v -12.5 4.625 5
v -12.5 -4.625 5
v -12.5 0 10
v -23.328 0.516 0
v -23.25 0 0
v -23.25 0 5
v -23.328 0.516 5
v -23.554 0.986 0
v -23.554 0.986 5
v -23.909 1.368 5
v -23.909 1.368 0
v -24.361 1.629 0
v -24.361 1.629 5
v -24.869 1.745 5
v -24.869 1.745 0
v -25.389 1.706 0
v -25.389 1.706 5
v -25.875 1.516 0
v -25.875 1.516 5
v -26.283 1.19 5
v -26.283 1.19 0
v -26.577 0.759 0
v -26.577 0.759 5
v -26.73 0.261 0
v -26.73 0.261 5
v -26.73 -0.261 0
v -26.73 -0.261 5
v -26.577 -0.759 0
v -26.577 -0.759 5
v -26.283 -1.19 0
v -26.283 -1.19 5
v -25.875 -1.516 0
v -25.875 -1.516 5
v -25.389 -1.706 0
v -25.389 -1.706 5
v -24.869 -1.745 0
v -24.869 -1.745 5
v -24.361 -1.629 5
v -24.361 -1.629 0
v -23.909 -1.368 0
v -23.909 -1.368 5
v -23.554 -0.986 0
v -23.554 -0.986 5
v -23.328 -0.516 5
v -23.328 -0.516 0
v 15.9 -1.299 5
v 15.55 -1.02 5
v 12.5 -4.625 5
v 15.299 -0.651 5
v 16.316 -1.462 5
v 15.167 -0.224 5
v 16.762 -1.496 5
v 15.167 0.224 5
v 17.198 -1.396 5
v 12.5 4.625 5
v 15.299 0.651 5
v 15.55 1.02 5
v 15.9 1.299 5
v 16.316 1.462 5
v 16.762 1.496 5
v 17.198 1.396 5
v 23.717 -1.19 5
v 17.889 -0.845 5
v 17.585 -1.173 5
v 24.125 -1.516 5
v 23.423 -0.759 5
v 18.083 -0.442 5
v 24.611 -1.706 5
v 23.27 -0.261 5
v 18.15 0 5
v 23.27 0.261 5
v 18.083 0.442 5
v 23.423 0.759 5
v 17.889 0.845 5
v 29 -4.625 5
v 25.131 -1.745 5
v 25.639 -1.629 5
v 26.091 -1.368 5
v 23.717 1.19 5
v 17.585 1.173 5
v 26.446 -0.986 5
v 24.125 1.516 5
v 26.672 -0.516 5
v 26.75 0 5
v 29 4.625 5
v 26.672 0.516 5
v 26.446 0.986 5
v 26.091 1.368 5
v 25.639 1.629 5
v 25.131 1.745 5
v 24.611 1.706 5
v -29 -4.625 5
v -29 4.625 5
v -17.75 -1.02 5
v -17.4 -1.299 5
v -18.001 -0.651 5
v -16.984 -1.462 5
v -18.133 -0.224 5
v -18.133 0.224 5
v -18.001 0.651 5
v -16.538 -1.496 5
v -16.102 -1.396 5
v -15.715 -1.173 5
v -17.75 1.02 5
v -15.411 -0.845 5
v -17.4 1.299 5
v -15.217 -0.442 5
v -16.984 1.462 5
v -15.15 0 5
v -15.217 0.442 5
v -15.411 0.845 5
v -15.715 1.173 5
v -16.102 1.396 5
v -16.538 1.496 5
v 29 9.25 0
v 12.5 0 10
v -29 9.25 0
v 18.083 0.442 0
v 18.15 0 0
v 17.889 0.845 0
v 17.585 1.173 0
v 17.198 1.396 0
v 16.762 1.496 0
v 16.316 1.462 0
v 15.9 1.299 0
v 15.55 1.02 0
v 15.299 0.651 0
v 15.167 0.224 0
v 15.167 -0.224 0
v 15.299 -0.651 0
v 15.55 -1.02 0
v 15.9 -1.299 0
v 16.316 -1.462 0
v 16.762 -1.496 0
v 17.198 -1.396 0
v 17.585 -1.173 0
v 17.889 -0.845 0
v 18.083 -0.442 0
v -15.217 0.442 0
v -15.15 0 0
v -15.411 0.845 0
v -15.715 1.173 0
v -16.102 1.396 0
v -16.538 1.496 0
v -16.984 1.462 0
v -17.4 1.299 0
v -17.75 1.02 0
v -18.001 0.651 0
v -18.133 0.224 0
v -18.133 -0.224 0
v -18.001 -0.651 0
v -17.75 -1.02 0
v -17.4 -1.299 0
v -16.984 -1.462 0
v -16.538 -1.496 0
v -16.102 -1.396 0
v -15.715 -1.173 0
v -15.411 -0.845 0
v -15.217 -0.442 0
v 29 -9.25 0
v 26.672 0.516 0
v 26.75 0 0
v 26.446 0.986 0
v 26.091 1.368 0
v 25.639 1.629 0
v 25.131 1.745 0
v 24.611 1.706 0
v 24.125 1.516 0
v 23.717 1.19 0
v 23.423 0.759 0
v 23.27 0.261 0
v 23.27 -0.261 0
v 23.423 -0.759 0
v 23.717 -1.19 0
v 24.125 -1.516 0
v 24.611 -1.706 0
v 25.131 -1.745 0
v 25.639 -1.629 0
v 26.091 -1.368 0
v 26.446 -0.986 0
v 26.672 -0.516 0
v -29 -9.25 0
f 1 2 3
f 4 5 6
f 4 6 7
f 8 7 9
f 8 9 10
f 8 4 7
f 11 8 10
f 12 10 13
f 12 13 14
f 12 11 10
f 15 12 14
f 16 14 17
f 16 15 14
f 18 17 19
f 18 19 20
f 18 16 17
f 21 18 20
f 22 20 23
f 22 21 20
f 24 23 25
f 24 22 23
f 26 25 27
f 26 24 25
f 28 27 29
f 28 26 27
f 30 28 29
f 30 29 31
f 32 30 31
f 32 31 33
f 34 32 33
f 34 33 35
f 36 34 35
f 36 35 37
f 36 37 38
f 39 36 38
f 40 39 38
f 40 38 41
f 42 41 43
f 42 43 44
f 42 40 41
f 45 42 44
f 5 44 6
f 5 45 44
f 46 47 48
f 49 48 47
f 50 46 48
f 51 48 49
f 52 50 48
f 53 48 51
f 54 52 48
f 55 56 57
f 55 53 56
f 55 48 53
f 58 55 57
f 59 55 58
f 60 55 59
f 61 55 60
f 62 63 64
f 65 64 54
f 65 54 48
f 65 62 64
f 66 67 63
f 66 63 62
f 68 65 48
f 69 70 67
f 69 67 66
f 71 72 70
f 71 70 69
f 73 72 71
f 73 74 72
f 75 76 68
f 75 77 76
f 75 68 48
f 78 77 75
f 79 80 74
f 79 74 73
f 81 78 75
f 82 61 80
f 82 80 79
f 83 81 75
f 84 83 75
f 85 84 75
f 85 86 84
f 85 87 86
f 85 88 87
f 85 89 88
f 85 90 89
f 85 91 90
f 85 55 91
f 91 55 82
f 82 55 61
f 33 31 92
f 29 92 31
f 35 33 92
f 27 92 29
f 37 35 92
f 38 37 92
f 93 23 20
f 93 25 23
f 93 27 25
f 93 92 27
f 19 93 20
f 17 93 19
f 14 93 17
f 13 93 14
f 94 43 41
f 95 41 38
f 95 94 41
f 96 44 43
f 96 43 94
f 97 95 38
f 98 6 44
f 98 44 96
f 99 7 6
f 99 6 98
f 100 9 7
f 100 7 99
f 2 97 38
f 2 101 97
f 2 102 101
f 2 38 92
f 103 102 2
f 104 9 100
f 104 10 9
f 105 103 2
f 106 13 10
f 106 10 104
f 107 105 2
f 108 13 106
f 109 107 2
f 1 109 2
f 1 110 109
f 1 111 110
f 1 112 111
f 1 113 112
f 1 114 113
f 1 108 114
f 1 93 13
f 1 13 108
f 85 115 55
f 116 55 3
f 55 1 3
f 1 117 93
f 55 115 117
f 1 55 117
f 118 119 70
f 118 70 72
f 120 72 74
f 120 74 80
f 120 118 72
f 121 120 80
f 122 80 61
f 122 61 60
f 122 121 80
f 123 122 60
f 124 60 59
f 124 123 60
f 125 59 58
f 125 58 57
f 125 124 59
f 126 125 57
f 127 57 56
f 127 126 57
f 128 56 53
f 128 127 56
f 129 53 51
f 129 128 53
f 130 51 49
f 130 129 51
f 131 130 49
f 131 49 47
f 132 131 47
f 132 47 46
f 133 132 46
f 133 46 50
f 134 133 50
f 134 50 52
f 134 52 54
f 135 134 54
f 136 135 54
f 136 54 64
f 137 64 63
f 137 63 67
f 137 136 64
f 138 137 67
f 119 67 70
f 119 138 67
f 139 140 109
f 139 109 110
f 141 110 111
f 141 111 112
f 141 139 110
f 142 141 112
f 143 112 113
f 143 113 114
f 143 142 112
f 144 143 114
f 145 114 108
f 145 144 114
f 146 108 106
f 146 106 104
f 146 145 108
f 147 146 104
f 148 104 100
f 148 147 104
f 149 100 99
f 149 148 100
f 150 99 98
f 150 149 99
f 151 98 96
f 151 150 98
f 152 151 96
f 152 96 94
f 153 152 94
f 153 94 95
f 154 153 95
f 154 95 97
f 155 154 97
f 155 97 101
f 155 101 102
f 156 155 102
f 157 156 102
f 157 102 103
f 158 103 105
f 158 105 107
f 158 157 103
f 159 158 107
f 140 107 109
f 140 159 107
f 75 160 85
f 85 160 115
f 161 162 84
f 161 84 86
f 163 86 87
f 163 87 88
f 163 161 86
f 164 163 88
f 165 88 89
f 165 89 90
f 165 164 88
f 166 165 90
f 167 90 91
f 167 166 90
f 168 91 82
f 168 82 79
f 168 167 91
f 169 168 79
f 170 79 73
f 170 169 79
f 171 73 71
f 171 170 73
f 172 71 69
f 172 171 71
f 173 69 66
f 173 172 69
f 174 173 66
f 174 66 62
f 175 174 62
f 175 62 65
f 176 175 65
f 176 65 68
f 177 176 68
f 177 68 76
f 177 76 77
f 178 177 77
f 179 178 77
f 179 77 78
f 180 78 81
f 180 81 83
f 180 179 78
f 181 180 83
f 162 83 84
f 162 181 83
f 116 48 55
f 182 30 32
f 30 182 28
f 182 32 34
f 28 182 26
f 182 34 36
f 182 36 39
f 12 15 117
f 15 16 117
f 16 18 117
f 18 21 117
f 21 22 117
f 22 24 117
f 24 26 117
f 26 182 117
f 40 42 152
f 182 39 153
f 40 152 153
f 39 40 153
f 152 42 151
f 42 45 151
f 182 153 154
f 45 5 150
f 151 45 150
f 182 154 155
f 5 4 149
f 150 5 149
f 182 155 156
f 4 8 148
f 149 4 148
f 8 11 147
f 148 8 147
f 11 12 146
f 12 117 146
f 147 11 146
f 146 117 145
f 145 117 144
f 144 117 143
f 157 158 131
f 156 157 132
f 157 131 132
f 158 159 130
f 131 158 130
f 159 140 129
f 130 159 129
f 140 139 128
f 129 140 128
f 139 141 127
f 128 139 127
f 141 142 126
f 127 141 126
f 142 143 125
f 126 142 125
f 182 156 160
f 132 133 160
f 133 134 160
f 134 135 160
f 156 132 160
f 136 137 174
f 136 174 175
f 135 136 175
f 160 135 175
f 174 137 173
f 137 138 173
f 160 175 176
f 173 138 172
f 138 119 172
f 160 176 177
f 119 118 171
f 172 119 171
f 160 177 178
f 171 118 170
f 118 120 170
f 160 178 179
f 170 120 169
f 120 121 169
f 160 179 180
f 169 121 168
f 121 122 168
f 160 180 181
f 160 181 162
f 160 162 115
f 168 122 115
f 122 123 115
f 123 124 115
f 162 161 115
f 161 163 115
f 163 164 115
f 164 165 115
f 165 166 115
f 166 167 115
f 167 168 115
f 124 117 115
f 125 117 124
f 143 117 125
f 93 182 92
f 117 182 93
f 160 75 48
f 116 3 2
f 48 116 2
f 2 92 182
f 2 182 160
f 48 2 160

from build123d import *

# Parameters (mm, degrees)
F0_W          = 38
F0_H          = 18.5
F0_R          = 1.5
F0_W_2        = 10
F0_R_2        = 1.75
F1_DEPTH      = 5
F2_W          = 25
F2_H          = 18.5
F3_DEPTH      = 5
F5_DEPTH      = 41.501
F5_DEPTH_BACK = 16.501


with BuildPart() as f1:
    # F0 (on Top) → F1 (new body)
    with BuildSketch(Plane.XY):
        Rectangle(F0_W, F0_H)
        with Locations((-16.65, 0)):
            Circle(F0_R, mode=Mode.SUBTRACT)
        with Locations((16.65, 0)):
            Circle(F0_R, mode=Mode.SUBTRACT)
        with Locations((24, 0)):
            Rectangle(F0_W_2, F0_H)
        with Locations((25, 0)):
            Circle(F0_R_2, mode=Mode.SUBTRACT)
        with Locations((-24, 0)):
            Rectangle(F0_W_2, F0_H)
        with Locations((-25, 0)):
            Circle(F0_R_2, mode=Mode.SUBTRACT)
    extrude(amount=F1_DEPTH)

    # F2 (on face) → F3 (join)
    with BuildSketch(Plane.XY.offset(5)):
        Rectangle(F2_W, F2_H)
    extrude(amount=F3_DEPTH)

    # F4 (on face) → F5 (cut, two sides)
    with BuildSketch(Plane(origin=(-12.5, 0, 0), x_dir=(0, -1, 0), z_dir=(-1, 0, 0))) as f5_sk:
        Polygon((-4.625, 5), (0, 10), (-9.25, 10), (-9.25, 5), align=None)
        Polygon((9.25, 10), (0, 10), (4.625, 5), (9.25, 5), align=None)
        Polygon((9.25, 5), (4.625, 5), (9.25, 0), align=None)
        Polygon((-9.25, 0), (-4.625, 5), (-9.25, 5), align=None)
    extrude(amount=-F5_DEPTH, mode=Mode.SUBTRACT)
    extrude(f5_sk.sketch, amount=F5_DEPTH_BACK, mode=Mode.SUBTRACT)


solid = f1.part
